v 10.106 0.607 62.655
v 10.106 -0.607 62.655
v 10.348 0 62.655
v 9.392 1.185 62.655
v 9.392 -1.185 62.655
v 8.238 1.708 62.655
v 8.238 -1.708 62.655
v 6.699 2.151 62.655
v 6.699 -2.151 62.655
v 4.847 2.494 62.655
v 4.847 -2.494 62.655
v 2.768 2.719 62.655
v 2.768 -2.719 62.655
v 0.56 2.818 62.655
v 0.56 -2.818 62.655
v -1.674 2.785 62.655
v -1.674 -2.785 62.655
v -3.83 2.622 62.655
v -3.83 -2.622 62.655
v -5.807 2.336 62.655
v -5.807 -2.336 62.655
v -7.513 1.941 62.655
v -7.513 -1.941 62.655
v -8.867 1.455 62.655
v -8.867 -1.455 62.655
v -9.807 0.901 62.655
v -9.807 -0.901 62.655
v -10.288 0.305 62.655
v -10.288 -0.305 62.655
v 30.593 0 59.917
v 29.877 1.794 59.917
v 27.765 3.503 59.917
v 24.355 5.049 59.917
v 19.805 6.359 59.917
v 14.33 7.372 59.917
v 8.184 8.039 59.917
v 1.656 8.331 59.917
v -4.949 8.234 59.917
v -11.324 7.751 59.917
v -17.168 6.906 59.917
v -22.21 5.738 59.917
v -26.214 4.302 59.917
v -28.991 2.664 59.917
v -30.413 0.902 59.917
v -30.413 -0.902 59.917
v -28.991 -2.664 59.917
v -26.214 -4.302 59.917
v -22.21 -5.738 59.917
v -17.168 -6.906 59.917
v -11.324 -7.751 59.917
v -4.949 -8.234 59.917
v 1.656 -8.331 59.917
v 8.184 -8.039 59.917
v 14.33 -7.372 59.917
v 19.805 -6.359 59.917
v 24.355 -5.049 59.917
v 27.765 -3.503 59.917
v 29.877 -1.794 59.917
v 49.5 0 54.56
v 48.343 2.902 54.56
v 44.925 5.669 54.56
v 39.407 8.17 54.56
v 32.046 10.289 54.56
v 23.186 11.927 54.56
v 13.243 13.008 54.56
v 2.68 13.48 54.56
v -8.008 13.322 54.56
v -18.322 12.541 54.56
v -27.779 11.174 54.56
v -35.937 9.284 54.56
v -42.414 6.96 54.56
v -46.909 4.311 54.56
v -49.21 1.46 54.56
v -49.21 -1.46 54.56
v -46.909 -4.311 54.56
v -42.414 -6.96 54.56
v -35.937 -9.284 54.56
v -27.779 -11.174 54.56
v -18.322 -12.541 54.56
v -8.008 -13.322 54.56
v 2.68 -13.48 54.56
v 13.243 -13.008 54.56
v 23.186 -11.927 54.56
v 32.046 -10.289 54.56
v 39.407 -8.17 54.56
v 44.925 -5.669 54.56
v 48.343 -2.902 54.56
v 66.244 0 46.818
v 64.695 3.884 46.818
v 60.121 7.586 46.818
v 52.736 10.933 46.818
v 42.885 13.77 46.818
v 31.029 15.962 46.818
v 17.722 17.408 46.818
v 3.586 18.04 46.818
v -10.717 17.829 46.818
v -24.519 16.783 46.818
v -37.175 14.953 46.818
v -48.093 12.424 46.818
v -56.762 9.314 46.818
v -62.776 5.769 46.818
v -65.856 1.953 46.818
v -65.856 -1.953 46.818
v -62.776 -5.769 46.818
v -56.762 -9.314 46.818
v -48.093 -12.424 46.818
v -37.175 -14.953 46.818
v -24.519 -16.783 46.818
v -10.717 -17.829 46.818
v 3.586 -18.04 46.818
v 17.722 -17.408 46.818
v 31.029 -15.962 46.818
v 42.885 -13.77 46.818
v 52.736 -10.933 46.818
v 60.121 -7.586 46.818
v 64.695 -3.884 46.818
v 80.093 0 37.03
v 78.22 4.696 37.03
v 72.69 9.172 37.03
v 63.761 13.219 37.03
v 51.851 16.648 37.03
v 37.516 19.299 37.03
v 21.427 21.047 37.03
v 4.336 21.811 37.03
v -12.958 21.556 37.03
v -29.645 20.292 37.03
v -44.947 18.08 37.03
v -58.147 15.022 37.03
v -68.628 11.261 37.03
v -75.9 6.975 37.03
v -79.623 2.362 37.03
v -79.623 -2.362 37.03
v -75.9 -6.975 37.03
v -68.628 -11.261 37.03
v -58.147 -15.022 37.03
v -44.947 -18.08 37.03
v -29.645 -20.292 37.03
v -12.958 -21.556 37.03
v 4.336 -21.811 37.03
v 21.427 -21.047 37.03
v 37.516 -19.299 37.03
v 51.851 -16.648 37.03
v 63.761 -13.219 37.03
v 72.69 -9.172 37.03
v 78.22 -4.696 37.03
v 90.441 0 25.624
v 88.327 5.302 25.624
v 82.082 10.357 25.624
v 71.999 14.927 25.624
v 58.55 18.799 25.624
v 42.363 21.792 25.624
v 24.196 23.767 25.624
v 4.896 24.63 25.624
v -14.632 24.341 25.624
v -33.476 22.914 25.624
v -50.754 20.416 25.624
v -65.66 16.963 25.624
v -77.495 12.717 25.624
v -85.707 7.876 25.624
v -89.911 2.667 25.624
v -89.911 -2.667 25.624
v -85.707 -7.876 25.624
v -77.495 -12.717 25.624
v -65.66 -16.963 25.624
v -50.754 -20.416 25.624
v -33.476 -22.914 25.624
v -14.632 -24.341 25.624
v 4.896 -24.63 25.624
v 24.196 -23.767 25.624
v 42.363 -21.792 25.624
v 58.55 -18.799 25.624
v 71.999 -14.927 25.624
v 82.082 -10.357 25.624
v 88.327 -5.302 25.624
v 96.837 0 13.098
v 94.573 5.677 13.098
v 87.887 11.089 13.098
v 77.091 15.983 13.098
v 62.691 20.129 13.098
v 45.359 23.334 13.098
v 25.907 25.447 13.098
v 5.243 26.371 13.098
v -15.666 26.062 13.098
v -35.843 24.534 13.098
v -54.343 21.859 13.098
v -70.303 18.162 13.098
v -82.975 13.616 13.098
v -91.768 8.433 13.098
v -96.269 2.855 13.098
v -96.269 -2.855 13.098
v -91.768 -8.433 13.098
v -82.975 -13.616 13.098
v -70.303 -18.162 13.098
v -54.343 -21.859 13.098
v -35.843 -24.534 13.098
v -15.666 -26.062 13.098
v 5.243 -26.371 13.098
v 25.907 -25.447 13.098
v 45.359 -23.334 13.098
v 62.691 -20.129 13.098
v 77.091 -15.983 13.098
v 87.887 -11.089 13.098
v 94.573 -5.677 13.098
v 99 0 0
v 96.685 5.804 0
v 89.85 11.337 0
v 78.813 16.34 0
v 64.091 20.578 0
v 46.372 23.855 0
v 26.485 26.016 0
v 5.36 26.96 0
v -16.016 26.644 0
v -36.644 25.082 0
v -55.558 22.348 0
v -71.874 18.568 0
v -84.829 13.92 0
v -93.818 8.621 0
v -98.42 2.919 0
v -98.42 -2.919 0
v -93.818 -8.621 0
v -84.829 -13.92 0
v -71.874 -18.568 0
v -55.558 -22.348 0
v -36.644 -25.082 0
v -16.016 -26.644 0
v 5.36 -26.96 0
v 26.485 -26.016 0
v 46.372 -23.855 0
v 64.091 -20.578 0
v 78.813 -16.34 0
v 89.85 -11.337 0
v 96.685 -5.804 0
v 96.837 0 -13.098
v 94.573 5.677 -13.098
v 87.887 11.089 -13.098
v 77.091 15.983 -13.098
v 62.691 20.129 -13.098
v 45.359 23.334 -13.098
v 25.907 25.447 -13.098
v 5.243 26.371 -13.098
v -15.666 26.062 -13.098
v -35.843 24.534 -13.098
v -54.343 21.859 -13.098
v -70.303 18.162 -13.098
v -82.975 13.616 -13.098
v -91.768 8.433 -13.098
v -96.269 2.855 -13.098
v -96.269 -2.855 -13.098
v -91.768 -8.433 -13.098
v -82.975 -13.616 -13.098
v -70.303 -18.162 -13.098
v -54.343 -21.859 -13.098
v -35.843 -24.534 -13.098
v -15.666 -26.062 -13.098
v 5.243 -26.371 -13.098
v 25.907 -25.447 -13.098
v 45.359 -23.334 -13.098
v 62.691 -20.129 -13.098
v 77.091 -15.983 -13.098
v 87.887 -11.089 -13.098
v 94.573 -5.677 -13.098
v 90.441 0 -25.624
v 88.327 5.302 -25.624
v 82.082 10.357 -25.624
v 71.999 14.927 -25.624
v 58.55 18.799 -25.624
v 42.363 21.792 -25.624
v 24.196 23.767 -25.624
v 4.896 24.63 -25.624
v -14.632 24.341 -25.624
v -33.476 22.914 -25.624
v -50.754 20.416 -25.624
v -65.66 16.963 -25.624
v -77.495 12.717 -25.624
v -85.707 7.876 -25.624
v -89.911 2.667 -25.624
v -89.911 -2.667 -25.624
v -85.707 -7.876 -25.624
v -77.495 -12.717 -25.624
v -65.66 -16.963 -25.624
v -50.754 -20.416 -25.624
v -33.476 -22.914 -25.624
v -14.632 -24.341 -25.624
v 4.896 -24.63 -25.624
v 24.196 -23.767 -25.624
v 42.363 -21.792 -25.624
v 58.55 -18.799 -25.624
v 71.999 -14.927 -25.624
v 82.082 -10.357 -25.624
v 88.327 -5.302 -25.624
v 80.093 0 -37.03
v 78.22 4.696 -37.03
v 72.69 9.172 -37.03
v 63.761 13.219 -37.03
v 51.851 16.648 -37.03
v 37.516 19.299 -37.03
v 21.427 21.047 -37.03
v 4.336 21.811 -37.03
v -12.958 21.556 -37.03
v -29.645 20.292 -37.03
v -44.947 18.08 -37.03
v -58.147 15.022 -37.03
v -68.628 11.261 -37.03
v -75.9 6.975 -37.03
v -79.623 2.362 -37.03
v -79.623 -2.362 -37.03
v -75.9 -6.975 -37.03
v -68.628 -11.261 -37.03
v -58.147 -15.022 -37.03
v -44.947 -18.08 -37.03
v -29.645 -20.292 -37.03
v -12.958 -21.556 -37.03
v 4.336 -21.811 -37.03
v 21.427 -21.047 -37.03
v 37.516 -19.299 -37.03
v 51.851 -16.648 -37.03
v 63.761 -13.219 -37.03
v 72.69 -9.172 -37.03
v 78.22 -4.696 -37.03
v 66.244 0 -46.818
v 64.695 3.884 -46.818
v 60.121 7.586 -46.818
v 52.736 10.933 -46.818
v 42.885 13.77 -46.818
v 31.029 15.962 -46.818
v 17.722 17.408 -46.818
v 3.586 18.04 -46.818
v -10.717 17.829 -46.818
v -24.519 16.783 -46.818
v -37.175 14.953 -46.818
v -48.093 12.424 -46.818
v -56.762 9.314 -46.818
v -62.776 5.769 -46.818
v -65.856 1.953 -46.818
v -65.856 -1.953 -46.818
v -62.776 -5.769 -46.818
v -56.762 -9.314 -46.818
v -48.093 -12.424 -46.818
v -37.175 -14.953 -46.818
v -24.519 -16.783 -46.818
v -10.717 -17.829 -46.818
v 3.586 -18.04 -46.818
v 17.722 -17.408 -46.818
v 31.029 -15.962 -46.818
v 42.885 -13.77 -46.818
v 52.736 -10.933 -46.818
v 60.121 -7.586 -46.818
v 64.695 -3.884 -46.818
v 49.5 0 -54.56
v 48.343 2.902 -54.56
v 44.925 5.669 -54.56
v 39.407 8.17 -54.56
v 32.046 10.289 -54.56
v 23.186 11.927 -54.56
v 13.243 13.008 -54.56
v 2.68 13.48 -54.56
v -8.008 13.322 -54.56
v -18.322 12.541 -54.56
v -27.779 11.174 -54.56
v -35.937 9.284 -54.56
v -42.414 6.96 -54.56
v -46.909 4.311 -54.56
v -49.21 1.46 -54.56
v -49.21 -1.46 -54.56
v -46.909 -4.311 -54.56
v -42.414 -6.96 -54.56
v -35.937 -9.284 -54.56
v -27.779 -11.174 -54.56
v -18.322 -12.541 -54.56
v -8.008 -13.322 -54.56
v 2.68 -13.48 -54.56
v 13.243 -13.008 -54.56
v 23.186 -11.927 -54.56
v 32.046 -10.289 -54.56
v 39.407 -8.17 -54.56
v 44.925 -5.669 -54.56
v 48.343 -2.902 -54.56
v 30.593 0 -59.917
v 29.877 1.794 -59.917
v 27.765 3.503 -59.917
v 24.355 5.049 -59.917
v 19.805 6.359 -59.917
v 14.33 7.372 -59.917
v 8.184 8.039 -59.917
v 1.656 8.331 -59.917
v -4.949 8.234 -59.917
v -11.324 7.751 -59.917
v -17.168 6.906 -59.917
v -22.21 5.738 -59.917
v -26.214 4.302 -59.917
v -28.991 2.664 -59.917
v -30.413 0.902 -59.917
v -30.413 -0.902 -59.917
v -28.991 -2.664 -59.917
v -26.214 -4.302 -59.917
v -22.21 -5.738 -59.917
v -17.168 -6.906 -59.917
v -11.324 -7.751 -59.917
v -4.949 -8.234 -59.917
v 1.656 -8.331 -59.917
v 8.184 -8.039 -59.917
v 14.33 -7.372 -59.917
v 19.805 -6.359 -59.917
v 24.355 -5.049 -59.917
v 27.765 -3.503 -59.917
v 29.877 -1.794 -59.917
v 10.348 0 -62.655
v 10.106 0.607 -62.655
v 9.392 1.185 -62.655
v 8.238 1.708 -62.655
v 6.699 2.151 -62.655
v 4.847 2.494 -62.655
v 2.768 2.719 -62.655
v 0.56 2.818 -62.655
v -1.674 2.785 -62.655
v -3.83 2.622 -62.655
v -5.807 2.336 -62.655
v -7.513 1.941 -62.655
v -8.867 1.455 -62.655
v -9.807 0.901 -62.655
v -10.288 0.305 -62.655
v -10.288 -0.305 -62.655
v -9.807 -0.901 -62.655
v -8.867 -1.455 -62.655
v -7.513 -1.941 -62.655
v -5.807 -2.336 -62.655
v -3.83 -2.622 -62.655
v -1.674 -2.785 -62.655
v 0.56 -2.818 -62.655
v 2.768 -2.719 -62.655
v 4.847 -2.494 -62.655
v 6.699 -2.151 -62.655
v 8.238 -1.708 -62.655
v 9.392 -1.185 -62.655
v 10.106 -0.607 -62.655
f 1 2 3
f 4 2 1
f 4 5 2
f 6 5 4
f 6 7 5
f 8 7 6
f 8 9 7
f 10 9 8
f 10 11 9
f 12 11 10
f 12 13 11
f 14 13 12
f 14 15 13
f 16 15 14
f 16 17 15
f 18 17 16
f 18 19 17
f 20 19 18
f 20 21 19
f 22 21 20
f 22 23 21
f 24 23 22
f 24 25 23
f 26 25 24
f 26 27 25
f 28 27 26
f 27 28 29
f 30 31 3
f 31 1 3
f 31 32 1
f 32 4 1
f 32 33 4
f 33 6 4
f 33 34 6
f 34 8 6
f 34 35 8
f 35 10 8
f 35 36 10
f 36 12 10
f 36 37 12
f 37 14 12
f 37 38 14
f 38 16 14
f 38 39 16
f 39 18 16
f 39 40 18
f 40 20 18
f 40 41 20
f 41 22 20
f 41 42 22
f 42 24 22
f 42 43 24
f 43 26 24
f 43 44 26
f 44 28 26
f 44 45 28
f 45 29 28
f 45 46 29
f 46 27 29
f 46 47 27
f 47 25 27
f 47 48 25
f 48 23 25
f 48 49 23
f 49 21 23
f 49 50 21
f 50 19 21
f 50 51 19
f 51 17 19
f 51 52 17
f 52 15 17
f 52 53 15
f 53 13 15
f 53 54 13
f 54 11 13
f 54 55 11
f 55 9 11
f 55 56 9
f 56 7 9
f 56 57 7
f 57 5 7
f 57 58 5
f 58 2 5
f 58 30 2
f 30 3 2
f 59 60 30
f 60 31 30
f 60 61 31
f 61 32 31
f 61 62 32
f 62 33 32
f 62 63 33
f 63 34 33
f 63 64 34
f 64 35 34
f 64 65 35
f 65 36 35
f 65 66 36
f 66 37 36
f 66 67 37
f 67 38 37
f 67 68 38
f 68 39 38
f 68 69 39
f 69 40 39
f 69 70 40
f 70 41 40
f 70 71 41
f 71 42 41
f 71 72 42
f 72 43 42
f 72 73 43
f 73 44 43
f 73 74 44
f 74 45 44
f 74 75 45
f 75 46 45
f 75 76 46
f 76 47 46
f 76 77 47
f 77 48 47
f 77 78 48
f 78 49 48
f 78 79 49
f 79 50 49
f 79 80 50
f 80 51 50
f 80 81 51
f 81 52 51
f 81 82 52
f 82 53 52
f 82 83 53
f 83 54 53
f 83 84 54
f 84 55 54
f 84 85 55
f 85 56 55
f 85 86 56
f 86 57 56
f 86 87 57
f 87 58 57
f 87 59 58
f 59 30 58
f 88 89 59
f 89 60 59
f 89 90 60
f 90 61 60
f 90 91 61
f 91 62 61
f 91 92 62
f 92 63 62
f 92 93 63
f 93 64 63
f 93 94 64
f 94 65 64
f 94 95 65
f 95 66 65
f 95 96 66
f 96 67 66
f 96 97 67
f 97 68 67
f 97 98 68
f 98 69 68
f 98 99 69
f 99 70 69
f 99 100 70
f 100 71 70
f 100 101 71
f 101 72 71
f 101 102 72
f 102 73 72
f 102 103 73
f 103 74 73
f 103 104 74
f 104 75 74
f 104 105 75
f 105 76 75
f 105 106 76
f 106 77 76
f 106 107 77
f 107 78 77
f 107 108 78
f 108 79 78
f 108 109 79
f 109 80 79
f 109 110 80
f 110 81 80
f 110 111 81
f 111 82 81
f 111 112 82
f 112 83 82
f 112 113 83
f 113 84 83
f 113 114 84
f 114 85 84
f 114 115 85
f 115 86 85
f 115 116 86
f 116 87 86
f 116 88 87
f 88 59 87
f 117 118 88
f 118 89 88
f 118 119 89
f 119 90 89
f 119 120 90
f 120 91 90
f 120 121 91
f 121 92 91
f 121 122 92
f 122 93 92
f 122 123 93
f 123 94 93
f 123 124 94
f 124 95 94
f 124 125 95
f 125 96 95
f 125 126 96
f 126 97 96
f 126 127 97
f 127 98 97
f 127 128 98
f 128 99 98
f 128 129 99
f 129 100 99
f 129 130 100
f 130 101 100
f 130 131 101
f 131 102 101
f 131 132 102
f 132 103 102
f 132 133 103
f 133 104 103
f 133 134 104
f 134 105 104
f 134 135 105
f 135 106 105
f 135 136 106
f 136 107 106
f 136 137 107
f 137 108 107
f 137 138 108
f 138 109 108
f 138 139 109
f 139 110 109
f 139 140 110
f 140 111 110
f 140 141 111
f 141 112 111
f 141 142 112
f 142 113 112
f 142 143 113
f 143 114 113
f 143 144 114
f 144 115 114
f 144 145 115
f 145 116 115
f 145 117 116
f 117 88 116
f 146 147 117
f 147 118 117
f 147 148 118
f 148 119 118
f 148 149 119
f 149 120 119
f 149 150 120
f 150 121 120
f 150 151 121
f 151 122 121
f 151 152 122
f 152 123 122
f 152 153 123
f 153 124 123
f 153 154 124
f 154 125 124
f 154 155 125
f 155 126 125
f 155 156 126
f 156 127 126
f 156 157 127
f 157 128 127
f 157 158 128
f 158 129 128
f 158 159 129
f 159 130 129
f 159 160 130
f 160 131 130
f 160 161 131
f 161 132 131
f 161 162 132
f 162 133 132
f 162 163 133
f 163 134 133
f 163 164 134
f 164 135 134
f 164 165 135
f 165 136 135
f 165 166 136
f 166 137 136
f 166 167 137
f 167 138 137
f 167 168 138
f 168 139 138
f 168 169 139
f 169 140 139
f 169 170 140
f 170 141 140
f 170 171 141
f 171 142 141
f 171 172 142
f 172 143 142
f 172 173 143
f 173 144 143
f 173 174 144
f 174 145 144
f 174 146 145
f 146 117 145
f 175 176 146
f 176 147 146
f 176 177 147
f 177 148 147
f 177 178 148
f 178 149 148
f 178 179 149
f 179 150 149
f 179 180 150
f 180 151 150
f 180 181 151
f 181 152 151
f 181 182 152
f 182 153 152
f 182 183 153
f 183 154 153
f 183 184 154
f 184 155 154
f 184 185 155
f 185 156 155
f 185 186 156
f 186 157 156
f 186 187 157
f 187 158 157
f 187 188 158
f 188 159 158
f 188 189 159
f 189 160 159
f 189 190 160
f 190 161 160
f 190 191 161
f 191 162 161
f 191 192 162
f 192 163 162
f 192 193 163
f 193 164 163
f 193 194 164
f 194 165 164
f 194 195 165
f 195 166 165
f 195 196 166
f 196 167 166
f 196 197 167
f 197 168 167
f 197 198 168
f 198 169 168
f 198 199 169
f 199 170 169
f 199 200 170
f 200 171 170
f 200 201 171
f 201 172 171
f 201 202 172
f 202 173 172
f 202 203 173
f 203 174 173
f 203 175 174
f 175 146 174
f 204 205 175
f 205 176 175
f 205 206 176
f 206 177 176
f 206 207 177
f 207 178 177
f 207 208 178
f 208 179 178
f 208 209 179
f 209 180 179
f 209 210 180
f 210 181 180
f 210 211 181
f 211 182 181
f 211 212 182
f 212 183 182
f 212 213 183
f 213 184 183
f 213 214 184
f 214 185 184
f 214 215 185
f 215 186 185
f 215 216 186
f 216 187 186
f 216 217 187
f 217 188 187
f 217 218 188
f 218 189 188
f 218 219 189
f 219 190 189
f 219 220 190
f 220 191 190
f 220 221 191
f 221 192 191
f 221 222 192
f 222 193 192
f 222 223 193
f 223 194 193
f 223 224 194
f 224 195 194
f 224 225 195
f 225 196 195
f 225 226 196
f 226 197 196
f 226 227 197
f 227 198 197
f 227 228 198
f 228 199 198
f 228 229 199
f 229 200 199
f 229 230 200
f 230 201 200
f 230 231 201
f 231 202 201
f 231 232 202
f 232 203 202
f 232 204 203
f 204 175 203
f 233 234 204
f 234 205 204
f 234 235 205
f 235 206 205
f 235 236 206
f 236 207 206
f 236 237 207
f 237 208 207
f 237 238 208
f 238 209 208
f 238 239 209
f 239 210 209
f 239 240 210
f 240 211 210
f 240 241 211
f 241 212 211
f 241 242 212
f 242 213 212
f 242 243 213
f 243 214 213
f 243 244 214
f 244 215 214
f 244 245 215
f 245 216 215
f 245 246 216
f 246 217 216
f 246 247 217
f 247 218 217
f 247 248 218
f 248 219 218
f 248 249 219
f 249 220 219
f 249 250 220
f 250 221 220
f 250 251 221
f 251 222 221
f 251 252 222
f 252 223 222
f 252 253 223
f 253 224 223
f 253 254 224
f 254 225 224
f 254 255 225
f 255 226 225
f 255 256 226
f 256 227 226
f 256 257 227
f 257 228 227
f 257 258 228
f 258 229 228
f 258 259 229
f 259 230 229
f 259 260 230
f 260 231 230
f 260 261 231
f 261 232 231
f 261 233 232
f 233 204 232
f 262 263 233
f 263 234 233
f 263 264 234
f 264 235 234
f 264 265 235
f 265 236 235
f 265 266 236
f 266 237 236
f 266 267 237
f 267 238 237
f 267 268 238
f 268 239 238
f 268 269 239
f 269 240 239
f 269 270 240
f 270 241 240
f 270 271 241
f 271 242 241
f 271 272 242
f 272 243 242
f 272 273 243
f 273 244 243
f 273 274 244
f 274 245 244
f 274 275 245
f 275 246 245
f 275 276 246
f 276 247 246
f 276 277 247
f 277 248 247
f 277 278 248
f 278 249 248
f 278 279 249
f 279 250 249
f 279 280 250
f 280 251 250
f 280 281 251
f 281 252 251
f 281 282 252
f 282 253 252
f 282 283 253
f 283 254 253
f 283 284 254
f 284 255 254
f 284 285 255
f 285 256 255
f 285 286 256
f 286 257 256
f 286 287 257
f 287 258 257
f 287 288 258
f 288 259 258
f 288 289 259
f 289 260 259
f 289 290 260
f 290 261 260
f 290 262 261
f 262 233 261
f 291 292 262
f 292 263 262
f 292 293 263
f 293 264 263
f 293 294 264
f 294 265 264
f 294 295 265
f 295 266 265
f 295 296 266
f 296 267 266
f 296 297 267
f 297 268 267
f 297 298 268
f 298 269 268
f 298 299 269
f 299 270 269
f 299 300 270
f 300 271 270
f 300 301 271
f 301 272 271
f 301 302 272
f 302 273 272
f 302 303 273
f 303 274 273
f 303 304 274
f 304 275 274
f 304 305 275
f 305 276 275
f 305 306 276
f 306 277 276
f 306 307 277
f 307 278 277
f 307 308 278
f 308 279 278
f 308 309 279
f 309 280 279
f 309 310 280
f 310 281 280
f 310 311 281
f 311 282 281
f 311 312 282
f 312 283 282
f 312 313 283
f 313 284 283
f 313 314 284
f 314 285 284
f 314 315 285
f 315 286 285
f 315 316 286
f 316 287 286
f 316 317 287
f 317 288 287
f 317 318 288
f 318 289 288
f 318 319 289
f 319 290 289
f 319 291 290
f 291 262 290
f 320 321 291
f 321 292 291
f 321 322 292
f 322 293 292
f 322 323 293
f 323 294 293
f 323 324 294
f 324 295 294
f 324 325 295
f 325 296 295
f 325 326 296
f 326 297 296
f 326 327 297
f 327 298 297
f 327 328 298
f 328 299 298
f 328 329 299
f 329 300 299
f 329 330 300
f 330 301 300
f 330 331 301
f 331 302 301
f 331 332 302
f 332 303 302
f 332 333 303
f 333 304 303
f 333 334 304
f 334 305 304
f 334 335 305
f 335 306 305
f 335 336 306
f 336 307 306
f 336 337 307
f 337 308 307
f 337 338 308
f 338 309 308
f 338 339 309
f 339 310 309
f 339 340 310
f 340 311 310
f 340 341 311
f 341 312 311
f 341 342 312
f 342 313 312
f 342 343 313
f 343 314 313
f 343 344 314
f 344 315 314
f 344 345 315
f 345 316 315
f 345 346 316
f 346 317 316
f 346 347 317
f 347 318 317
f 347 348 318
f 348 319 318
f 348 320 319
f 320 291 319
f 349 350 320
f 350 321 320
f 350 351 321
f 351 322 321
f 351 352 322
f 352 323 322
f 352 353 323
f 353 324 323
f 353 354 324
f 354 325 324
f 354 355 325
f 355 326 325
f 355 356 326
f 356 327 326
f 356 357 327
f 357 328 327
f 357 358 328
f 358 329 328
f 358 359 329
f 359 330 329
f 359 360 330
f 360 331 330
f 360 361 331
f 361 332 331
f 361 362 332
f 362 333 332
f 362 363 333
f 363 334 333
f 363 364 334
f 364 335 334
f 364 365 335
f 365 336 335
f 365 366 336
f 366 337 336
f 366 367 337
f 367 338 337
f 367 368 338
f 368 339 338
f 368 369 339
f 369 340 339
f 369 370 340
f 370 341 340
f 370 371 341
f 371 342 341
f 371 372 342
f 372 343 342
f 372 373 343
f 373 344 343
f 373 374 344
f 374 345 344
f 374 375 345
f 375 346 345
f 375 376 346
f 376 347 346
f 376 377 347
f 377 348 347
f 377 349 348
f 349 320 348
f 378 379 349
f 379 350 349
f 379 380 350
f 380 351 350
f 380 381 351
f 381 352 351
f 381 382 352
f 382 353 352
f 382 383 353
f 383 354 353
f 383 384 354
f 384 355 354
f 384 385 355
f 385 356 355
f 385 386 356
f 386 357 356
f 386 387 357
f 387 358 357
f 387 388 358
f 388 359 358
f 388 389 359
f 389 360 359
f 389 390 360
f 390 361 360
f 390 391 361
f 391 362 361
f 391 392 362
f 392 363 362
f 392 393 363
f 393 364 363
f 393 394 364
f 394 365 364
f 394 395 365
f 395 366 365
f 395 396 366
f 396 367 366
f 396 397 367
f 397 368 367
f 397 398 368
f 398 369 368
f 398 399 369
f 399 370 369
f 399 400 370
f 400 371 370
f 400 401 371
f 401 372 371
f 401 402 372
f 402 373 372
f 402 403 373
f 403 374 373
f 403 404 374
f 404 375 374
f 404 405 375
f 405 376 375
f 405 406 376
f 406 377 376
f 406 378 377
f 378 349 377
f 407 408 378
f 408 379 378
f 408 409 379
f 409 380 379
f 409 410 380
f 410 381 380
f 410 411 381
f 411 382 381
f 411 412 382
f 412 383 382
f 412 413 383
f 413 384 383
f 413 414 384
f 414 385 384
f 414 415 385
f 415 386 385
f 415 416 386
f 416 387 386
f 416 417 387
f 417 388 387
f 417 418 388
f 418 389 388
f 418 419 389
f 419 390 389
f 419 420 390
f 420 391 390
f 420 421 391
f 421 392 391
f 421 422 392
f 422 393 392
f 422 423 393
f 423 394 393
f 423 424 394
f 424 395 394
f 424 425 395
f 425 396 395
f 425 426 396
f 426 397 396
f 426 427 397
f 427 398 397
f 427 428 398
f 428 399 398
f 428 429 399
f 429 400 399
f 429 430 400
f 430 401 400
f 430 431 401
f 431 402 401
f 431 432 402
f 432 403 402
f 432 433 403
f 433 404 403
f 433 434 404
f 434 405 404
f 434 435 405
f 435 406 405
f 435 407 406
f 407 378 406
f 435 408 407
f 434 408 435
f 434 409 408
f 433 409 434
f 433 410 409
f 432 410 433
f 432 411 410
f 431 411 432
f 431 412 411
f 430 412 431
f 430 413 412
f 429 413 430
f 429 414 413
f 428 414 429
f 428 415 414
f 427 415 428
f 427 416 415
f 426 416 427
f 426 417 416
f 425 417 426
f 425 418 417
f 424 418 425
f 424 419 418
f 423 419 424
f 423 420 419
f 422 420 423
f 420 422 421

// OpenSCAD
// Generated by SolidPython 1.0.1 on 2020-07-29 00:46:49


scale(v = [11, 3, 7]) {
	sphere(r = 9);
}
/***********************************************
*********      SolidPython code:      **********
************************************************
 
# import packages: SolidPython
from solid import *
from solid.utils import *
from itertools import chain, combinations, permutations


class Resize:

    def __init__(self, scad_file):
        self.scad_file = scad_file
        #self.scad_file = import_scad(scad_file)
        # cone/cylinder param:
        self.r1 = 0
        self.r2 = 0
        self.h = 0
        # rectangular prism param:
        self.w = 0
        self.l = 0
        # ellipse param:
        self.r = 0

    # import OpenScad code (file name corresponds to shape)


    # classify shape + parameters
    def assign(self, param1, param2, param3):
        if self.scad_file == 'cone.scad':
            self.r1 = param1
            self.r2 = param2
            self.h = param3
        elif self.scad_file == 'cylinder.scad':
            self.r1 = param1
            self.r2 = param2
            self.h = param3
        elif self.scad_file == 'rectangularPrism.scad':
            self.h = param1
            self.l = param2
            self.w = param3
        else:
            self.r = param1
            self.h = param2

    # resize parameters
    def iterate(self):
        x = range(3, 20, 2)
        i = 1
        if self.scad_file == 'cone.scad':
            tempList = list(permutations(x, 2))
            for temp in tempList:
                param1 = temp[0]
                param2 = temp[1]
                filepath = 'produced_scad_files/' + 'cone' + str(param1) + '_' + str(param2) + '_' + '.scad'
                scad_render_to_file(cylinder(h=param1, r1=param2, r2=0), filepath)

        elif self.scad_file == 'cylinder.scad':
            tempList = list(permutations(x, 3))
            for temp in tempList:
                param1 = temp[0]
                param2 = temp[1]
                filepath = 'produced_scad_files/' + 'cylinder' + str(param1) + '_' + str(param2) + '_' + '.scad'
                scad_render_to_file(cylinder(h=param1, r1=param2, r2=param2), filepath)

        elif self.scad_file == 'rectangularPrism.scad':
            tempList = list(permutations(x, 3))
            for temp in tempList:
                param1 = temp[0]
                param2 = temp[1]
                param3 = temp[2]
                filepath = 'produced_scad_files/' + 'rectangularPrism' + str(param1) + '_' + str(param2) + '_' + str(
                    param3) + '.scad'
                scad_render_to_file(cube(size=(param1, param2, param3)), filepath)

        elif self.scad_file == 'ellipse.scad':
            tempList = list(permutations(x, 4))
            for temp in tempList:
                param1 = temp[0]
                param2 = temp[1]
                param3 = temp[2]
                param4 = temp[3]
                filepath = 'produced_scad_files/' + 'ellipse' + str(param1) + '_' + str(param2) + '_' + str(param3) + '_' + str(param4) + '.scad'
                scad_render_to_file(scale([param1, param2, param3])(sphere(r=param4)), filepath)

    def render_to_scadfile(self):
        scad_render_to_file(scad, 'example.scad') 
 
************************************************/
